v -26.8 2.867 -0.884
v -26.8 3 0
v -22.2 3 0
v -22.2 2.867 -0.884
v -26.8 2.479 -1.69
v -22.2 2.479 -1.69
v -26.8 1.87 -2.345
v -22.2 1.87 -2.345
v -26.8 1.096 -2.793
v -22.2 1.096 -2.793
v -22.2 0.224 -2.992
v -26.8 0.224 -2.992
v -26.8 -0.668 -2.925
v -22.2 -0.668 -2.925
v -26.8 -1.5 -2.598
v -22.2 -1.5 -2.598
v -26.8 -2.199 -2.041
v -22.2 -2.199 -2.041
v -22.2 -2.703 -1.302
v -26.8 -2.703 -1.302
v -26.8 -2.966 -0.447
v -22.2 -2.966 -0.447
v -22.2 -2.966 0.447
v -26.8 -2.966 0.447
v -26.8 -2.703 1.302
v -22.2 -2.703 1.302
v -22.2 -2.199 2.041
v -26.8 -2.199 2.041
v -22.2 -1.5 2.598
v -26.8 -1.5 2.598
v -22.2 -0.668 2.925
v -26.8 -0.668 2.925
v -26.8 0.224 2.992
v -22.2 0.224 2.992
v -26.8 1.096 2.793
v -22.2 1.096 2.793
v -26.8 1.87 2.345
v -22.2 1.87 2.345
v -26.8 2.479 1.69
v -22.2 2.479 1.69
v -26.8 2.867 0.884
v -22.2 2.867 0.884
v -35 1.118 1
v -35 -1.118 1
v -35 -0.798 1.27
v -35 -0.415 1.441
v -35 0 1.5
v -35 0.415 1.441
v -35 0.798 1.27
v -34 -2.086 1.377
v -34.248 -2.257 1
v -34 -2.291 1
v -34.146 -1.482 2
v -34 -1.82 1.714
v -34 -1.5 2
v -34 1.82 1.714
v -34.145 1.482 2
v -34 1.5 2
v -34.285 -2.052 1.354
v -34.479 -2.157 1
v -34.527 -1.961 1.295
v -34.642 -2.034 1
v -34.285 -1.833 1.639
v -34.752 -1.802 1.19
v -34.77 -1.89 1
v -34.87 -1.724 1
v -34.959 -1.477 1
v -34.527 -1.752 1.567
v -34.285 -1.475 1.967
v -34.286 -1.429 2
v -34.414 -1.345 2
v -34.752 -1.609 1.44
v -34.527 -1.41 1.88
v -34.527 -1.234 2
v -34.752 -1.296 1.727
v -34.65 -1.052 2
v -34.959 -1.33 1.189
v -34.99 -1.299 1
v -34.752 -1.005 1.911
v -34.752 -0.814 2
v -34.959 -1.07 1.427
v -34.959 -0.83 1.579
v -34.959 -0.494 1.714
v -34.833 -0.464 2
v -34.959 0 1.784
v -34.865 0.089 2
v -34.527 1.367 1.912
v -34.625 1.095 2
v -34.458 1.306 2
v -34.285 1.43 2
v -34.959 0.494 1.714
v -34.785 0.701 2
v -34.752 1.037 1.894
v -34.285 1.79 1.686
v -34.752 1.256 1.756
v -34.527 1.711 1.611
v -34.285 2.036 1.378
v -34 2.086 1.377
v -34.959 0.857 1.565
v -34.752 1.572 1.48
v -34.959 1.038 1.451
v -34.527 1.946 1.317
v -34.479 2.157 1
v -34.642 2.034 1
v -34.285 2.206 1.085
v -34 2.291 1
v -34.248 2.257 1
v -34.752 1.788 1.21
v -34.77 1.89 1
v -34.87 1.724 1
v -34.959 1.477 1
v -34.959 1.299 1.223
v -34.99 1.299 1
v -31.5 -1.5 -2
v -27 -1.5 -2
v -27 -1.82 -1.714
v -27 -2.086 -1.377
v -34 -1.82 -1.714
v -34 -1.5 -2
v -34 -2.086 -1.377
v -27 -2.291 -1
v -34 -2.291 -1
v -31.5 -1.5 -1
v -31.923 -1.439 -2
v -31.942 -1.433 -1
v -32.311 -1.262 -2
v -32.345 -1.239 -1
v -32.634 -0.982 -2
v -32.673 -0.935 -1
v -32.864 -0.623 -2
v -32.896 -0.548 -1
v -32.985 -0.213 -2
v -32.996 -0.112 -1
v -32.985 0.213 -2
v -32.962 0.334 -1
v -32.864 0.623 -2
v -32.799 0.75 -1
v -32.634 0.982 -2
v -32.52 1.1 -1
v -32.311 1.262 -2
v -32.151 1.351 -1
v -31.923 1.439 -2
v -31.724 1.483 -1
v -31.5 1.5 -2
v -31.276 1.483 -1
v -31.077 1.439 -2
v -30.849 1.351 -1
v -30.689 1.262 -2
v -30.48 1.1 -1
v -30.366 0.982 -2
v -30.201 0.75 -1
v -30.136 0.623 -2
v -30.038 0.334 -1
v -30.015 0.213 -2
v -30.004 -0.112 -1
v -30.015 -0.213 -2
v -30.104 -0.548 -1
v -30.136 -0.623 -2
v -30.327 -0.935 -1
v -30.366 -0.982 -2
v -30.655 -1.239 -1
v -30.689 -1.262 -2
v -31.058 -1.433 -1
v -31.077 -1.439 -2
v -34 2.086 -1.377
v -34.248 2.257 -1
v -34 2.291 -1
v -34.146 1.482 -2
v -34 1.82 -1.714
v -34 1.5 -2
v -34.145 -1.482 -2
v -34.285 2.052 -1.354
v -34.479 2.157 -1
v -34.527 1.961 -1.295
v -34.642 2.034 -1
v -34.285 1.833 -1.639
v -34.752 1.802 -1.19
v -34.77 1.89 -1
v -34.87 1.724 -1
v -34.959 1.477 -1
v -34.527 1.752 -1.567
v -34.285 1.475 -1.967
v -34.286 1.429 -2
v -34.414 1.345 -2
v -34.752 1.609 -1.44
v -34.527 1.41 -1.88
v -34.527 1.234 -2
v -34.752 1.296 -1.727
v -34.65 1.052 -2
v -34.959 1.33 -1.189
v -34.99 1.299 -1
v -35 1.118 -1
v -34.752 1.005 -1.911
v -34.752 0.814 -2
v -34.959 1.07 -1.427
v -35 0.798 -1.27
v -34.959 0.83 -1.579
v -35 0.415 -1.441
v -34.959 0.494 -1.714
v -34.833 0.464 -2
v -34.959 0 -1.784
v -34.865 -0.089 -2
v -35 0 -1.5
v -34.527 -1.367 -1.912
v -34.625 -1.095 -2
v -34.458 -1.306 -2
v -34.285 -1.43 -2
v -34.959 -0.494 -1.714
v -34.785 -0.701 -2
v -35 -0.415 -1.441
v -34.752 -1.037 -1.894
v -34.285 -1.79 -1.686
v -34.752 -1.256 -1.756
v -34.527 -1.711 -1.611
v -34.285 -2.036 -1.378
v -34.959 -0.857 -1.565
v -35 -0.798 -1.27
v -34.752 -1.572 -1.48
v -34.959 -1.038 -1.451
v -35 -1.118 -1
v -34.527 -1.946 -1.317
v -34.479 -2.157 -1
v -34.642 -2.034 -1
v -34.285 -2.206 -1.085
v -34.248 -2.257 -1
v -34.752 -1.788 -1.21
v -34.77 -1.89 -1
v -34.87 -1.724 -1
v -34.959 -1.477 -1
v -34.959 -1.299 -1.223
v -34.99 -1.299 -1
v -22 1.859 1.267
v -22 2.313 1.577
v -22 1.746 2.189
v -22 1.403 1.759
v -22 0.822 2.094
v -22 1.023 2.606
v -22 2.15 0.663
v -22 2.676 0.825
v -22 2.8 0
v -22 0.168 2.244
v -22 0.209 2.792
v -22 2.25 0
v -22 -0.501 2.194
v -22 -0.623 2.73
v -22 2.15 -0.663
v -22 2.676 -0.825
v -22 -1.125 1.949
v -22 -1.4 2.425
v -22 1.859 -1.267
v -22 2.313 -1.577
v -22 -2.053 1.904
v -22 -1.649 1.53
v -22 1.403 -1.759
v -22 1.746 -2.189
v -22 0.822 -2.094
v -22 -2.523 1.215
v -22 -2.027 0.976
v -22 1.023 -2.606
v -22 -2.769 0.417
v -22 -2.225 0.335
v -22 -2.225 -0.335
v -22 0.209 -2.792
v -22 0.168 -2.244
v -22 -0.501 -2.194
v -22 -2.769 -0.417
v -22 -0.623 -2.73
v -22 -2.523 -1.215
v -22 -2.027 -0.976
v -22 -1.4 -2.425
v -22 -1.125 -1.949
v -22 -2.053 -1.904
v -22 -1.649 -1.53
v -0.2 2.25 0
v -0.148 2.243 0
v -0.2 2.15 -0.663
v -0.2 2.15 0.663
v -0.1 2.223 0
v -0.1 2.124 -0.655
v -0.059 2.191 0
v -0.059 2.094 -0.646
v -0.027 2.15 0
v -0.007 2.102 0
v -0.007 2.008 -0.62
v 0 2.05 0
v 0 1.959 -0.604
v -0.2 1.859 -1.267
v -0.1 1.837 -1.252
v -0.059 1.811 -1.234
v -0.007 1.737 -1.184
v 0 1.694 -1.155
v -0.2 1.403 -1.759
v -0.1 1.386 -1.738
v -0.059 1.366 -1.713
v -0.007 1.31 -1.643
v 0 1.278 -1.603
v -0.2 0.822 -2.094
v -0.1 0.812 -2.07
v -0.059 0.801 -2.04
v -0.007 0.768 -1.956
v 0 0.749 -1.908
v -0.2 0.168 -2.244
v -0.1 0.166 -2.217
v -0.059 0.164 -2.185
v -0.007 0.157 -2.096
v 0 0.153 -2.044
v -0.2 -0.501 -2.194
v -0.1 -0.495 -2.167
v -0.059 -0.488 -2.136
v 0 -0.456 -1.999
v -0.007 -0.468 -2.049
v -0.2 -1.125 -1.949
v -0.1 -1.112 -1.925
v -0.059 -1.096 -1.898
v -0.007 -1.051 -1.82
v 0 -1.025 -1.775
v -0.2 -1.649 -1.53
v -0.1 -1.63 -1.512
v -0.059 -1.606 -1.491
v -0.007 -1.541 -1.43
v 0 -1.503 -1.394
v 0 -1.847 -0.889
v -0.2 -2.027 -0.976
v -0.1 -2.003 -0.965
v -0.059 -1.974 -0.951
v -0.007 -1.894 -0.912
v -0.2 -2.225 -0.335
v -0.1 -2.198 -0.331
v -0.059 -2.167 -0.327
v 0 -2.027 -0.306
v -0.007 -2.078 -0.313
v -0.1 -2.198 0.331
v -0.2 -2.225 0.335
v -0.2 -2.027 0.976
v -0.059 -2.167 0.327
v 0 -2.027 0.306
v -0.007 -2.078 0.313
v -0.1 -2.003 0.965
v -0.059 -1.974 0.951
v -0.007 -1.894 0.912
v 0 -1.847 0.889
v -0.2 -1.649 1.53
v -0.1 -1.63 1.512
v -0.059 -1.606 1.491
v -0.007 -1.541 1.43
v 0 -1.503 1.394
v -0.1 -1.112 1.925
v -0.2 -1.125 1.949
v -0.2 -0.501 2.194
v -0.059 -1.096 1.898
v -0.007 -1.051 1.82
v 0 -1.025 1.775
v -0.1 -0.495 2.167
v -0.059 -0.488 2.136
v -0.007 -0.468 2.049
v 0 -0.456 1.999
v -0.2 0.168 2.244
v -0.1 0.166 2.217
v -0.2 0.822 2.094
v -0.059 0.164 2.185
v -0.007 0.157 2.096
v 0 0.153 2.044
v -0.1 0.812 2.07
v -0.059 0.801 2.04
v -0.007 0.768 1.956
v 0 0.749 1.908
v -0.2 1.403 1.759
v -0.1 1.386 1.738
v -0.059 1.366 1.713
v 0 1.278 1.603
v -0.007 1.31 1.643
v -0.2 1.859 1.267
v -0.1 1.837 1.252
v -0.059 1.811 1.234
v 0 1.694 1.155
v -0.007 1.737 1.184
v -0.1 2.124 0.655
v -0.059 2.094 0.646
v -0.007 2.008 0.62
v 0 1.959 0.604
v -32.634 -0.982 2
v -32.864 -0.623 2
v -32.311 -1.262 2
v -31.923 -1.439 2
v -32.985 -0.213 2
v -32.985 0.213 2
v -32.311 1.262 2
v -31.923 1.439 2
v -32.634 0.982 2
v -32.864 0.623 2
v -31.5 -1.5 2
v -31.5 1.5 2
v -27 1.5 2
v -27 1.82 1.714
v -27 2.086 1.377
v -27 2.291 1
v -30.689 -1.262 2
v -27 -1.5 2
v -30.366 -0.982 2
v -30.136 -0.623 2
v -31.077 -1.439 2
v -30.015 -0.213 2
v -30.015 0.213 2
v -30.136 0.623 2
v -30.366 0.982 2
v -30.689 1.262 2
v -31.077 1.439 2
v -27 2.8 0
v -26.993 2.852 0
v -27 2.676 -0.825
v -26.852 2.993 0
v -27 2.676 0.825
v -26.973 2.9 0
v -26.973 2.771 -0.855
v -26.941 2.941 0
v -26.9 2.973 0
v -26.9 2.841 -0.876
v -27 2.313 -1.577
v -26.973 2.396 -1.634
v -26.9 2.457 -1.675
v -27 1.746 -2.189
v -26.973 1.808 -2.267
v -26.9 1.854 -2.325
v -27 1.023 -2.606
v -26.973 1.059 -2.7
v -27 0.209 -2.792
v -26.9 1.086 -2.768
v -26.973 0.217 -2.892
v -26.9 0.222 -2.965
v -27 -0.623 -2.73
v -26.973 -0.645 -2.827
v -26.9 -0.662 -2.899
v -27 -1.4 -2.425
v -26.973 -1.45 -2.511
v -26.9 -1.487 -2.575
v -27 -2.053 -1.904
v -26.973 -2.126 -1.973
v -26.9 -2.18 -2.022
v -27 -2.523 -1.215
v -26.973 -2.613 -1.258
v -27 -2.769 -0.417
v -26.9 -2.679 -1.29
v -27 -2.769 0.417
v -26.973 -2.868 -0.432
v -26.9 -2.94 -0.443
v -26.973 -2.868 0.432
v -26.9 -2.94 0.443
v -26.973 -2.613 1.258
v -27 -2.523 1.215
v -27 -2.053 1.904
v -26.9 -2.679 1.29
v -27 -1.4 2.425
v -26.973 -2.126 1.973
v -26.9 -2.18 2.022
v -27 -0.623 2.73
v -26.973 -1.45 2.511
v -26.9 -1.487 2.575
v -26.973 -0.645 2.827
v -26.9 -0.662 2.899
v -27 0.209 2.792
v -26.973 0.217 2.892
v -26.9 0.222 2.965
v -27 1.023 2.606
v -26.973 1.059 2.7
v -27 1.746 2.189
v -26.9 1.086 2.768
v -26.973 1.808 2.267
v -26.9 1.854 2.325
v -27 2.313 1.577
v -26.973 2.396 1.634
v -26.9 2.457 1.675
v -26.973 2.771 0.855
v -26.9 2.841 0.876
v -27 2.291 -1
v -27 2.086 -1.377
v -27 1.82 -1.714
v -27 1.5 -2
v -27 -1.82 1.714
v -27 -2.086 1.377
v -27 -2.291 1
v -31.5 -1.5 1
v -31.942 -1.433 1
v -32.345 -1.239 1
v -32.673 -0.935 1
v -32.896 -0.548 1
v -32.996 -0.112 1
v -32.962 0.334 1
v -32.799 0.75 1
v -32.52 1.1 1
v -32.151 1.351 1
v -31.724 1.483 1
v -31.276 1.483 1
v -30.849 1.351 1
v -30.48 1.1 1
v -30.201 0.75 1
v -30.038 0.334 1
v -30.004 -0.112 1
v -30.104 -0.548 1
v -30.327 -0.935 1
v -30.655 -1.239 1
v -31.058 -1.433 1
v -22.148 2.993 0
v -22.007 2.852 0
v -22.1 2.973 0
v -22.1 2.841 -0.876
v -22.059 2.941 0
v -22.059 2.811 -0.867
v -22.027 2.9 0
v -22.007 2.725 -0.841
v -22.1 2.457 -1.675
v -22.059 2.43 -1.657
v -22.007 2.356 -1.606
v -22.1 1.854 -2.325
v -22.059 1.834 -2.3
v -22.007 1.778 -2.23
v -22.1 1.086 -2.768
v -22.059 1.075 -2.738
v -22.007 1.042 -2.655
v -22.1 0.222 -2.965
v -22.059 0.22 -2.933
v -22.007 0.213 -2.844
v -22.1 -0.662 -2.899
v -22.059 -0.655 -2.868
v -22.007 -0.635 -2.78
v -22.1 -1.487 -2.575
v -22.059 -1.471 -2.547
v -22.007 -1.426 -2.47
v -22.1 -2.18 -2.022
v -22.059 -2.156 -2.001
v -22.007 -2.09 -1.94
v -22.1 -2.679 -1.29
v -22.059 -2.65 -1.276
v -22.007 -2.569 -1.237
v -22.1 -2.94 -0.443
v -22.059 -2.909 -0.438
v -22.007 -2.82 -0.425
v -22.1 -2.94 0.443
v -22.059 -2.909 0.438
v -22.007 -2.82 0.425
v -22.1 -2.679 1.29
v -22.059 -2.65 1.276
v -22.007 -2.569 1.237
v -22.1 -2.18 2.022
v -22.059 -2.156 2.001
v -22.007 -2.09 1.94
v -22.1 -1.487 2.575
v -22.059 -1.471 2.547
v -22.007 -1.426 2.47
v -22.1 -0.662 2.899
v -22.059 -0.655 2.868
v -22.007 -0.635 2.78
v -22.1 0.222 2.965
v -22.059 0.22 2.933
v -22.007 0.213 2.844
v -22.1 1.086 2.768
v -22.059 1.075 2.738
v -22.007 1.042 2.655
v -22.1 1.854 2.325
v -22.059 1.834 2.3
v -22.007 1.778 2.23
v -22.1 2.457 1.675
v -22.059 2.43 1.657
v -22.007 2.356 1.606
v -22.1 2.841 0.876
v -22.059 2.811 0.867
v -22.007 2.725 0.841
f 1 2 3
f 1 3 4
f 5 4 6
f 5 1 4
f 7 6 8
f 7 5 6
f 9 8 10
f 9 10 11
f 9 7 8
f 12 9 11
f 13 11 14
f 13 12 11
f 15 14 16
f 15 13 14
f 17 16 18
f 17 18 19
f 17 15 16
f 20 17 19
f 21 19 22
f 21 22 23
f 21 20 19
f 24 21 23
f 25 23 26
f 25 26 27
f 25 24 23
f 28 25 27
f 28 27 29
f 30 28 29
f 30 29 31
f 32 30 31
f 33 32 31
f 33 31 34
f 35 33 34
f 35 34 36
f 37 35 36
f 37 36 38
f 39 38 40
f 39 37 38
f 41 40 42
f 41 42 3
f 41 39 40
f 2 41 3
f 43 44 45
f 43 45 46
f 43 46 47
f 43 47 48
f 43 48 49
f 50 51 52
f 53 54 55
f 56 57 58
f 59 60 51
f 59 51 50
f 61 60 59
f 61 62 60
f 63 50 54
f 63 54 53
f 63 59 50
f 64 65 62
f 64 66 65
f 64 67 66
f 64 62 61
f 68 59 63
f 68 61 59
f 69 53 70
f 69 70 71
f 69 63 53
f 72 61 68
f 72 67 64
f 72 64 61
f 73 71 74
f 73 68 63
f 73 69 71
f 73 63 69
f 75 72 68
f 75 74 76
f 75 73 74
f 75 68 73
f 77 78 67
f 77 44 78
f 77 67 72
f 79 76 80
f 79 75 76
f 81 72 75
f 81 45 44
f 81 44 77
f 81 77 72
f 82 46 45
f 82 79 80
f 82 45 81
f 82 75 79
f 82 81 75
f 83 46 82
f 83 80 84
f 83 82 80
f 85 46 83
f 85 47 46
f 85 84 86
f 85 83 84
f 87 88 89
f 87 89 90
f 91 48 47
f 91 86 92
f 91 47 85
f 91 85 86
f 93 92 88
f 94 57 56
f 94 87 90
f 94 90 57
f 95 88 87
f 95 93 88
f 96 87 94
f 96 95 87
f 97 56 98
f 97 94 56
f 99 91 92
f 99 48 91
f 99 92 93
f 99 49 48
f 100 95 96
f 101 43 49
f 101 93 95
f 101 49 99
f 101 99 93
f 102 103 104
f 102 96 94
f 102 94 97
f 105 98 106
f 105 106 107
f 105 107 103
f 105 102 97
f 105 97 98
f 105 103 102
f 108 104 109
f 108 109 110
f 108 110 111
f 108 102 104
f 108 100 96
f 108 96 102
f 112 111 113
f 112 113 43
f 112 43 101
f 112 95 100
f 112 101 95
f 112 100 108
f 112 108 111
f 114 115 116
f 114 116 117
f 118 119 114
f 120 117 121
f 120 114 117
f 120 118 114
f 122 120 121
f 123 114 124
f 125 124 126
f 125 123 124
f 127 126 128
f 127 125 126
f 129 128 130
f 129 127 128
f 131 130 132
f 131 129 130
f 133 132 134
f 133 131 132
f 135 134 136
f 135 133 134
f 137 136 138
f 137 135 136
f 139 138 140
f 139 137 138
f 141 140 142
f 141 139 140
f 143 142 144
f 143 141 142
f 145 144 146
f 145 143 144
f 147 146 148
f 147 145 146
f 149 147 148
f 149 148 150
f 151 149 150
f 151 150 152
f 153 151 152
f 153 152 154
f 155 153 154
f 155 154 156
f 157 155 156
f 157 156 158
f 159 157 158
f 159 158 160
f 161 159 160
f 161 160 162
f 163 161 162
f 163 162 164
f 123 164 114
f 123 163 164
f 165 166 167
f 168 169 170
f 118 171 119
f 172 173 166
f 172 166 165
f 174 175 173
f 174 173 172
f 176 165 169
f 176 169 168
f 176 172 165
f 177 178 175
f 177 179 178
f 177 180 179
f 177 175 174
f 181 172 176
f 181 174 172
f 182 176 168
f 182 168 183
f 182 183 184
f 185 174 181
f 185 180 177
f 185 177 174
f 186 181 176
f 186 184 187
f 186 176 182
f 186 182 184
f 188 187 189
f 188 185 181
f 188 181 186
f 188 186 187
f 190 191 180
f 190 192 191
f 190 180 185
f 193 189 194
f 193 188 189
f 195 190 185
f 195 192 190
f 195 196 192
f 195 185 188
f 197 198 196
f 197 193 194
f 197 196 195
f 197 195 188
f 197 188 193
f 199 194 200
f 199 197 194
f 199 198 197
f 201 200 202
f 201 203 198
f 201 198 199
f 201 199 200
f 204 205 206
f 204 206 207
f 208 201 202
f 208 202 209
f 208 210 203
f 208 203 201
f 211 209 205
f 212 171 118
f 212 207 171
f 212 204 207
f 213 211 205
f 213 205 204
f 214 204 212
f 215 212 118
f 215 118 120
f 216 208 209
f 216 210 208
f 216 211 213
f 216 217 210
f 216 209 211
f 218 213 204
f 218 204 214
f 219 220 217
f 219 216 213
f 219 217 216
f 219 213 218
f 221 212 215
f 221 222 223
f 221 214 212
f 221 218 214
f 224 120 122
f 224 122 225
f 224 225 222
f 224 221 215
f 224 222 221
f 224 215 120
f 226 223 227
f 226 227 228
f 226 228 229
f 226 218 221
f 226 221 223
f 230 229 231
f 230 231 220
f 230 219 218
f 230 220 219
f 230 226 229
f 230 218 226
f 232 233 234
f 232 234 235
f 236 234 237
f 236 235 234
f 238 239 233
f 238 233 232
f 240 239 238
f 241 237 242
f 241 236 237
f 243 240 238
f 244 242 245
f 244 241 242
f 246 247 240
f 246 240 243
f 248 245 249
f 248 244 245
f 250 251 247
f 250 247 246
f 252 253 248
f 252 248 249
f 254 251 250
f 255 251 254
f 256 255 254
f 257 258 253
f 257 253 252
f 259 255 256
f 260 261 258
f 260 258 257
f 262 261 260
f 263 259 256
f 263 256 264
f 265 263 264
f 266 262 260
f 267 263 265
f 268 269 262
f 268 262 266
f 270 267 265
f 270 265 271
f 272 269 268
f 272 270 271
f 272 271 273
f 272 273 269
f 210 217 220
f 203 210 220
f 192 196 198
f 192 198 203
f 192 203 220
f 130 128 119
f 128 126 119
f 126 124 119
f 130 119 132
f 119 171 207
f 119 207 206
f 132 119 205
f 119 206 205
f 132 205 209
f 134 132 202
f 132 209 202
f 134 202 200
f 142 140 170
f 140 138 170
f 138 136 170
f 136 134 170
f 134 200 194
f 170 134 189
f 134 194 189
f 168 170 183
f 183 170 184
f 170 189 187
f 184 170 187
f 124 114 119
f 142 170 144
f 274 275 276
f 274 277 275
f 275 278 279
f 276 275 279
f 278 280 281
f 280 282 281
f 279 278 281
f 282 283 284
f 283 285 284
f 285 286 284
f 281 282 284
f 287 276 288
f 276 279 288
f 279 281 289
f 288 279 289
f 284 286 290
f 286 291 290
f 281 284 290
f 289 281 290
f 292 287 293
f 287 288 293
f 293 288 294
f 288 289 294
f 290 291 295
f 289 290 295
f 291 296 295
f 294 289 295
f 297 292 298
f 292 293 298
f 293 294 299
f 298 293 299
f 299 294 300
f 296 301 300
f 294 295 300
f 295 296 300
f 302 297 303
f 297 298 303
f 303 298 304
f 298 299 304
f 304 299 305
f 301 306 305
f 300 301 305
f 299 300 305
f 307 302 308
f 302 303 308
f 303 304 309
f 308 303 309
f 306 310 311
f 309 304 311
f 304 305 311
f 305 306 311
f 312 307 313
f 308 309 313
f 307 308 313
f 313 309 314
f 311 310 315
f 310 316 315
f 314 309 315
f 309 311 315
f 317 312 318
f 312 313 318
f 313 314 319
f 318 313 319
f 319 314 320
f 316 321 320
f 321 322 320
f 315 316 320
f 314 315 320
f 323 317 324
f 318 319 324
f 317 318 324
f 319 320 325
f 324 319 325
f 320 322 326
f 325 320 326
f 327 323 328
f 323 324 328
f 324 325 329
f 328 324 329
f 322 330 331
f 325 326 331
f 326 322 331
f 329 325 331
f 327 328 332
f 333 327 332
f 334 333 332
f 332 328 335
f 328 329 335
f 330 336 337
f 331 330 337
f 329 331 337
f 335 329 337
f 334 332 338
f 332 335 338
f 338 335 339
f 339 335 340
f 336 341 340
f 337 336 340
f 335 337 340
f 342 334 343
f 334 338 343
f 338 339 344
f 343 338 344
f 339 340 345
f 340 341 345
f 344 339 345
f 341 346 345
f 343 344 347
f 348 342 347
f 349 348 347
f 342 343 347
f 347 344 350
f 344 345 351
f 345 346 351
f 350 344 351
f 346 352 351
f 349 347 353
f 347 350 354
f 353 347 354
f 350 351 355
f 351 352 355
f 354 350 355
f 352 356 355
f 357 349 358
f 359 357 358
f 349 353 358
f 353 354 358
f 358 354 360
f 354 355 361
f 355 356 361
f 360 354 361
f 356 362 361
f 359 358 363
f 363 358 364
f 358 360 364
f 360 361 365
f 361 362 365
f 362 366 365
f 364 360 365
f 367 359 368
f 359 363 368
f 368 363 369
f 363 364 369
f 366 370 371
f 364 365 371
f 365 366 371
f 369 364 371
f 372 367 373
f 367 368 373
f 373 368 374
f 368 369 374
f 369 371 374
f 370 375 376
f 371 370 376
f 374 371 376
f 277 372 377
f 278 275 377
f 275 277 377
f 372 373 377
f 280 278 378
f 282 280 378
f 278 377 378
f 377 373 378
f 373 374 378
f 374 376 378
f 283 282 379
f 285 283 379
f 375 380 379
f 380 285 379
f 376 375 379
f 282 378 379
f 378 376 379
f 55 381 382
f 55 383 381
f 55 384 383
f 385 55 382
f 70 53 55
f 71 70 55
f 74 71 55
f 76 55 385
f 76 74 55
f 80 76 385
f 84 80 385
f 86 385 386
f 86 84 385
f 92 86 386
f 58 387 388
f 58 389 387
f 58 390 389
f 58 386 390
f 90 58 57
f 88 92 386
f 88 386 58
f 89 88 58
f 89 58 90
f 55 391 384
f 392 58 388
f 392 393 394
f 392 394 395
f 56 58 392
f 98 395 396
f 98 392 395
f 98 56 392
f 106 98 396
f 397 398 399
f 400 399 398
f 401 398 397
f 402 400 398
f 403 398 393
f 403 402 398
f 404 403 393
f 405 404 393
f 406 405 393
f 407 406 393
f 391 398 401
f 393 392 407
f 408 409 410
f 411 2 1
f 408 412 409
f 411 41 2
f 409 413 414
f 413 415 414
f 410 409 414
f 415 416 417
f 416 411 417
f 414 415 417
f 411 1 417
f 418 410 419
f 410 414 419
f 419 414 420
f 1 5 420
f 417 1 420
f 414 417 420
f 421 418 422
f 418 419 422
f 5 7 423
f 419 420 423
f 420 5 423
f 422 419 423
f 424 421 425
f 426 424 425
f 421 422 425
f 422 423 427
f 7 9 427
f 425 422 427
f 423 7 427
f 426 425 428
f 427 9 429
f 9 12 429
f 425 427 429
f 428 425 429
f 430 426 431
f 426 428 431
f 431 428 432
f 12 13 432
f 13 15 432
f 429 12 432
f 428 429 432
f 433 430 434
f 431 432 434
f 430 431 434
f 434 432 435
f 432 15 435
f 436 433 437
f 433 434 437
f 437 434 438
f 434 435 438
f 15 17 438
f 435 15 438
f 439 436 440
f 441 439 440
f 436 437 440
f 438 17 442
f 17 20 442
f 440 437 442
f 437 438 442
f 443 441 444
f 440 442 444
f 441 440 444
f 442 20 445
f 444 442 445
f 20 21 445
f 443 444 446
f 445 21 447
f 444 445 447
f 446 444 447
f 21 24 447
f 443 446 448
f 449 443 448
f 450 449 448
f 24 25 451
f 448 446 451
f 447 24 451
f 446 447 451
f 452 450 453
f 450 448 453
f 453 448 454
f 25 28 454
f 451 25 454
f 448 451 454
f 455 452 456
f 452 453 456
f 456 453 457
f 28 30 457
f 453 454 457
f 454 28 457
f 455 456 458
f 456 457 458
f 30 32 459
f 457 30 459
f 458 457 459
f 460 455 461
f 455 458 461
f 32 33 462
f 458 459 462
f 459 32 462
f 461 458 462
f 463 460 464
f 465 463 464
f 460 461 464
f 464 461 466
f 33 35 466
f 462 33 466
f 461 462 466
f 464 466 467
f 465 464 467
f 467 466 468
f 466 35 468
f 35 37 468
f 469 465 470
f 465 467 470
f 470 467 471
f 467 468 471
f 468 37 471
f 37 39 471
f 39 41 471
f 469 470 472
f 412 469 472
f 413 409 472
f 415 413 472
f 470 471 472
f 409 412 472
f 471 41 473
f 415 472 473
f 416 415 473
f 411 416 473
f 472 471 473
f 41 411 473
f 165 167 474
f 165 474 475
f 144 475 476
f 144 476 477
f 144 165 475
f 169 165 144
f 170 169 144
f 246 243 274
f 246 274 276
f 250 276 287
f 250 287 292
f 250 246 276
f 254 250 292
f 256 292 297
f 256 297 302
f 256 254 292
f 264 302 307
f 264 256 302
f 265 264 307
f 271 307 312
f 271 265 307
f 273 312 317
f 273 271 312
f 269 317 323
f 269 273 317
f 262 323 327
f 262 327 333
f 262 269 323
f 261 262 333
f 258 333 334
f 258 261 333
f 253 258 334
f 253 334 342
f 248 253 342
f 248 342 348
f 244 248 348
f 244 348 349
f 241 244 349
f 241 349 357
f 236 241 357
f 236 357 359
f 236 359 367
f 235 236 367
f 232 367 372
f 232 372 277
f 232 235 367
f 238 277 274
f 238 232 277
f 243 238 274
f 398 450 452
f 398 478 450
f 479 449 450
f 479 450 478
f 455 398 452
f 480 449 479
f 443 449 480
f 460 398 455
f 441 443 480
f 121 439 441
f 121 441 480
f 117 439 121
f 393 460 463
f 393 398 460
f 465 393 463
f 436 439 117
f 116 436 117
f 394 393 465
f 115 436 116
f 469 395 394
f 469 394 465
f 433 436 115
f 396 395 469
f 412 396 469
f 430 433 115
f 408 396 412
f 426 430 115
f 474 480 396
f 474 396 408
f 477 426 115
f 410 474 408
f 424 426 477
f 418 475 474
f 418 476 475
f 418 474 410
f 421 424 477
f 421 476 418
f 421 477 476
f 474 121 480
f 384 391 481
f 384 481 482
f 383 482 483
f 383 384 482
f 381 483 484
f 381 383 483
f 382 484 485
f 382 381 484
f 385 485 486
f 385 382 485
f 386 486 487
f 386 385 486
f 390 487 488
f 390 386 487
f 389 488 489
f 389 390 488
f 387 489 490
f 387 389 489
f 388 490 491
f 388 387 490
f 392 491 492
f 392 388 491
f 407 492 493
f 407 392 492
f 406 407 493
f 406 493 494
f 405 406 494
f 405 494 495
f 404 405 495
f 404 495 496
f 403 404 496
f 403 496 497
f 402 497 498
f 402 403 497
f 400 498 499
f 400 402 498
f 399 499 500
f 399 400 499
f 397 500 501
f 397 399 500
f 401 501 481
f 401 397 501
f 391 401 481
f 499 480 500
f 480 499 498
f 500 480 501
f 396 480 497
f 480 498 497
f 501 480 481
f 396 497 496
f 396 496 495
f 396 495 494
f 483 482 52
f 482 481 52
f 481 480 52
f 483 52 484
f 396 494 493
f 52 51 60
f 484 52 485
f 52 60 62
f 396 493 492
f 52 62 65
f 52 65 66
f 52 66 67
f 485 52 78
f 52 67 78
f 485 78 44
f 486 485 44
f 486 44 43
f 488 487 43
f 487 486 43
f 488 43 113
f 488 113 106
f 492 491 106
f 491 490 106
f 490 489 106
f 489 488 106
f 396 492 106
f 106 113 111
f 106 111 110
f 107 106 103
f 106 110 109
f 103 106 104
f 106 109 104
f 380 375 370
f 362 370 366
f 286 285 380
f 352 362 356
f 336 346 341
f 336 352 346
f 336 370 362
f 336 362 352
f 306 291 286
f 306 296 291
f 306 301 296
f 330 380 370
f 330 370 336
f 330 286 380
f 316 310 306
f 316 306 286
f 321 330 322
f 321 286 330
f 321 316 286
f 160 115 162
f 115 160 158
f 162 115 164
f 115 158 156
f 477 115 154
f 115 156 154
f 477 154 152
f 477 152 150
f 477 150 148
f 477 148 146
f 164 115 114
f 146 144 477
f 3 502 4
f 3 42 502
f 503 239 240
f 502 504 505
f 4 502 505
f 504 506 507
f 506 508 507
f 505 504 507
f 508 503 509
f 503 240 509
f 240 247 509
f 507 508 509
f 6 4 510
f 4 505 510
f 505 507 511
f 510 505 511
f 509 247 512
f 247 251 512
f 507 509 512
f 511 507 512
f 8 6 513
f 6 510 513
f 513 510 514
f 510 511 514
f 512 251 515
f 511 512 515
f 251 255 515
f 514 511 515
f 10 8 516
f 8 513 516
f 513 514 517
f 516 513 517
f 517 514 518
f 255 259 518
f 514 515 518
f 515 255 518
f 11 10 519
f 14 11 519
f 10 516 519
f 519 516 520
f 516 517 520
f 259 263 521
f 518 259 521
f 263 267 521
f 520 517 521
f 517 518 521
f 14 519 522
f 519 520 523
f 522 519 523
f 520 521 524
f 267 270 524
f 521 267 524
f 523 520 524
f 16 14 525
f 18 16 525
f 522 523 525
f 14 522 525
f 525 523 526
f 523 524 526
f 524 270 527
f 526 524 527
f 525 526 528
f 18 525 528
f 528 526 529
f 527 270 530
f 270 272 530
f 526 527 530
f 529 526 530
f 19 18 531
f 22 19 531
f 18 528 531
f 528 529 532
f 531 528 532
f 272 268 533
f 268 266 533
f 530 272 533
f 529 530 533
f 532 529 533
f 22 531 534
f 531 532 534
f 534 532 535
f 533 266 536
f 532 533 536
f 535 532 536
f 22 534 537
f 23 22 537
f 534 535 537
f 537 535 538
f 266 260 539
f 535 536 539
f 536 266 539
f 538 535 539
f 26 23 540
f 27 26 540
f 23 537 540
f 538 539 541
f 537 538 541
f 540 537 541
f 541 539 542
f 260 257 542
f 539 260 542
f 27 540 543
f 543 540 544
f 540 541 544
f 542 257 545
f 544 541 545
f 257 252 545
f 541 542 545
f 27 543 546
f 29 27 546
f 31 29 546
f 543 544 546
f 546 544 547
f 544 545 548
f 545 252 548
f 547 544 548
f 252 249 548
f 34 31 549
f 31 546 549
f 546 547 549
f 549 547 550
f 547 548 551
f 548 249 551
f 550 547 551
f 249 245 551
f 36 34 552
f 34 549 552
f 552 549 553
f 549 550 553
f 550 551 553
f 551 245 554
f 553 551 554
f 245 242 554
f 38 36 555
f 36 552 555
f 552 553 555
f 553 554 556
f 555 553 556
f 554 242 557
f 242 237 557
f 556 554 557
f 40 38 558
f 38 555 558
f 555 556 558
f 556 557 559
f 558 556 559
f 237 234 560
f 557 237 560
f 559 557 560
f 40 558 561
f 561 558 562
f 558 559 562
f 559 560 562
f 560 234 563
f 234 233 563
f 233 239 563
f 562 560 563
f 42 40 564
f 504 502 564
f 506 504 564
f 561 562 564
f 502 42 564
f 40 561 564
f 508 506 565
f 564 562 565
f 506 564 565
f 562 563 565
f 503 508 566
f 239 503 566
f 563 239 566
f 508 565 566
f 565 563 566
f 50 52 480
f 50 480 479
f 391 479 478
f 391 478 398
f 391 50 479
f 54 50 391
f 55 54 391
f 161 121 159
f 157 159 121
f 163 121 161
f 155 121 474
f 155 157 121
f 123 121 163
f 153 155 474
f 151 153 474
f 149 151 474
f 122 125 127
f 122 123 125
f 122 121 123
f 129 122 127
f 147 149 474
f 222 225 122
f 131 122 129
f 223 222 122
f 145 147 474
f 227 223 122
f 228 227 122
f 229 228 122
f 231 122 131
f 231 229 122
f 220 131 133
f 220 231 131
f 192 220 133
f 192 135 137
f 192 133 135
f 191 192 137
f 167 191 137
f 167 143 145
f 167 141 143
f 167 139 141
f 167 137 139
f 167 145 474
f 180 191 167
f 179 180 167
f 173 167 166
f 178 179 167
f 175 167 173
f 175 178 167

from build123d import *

# Parameters (mm, degrees)
FILLET_1_R               = 1
SKETCH_2_R               = 7.321356554
SKETCH_2_W               = 1
SKETCH_2_H               = 8.939101976
SKETCH_2_H_2             = 8.847887315
CUT_EXTRUDE_1_DEPTH      = 8
FILLET_2_R               = 0.2
CUT_EXTRUDE_2_DEPTH      = 36.355339178
CUT_EXTRUDE_2_DEPTH_BACK = 36.355339178
SKETCH_3_R               = 1.5


with BuildPart() as part:
    # 草图1 → 旋转1 (revolve)
    with BuildSketch(Plane.XY):
        Polygon((0, 0), (0, 2.25), (-22, 2.25), (-22, 3), (-27, 3), (-27, 2.5), (-35, 2.5), (-35, 0), align=None)
    revolve(axis=Axis((0, 0, 0), (-1, 0, 0)))

    # 圆角1
    fillet_1_edges = [part.edges().sort_by_distance(p)[0] for p in [
        (-35, -2.5, 0),
    ]]
    fillet(fillet_1_edges, radius=FILLET_1_R)

    # 草图2 → 切除-拉伸1 (cut)
    with BuildSketch(Plane.ZY.offset(35)):
        Circle(SKETCH_2_R)
        with Locations((-1.5, 0.70306053)):
            Rectangle(SKETCH_2_W, SKETCH_2_H, mode=Mode.SUBTRACT)
        with Locations((1.5, 0.129971064)):
            Rectangle(SKETCH_2_W, SKETCH_2_H_2, mode=Mode.SUBTRACT)
    extrude(amount=-CUT_EXTRUDE_1_DEPTH, mode=Mode.SUBTRACT)

    # 圆角2
    fillet_2_edges = [part.edges().sort_by_distance(p)[0] for p in [
        (-27, -3, 0),
        (-22, -3, 0),
        (0, -2.25, 0),
    ]]
    fillet(fillet_2_edges, radius=FILLET_2_R)

    # 草图3 → 切除-拉伸2 (cut, two sides: drawn at the far end of the back side and taken through both)
    with BuildSketch(Plane(origin=(0, 0, -1), x_dir=(-1, 0, 0), z_dir=(0, 0, -1)).offset(-CUT_EXTRUDE_2_DEPTH_BACK)):
        with Locations(Location((31.5, 0, 0), (0, 0, 270))):
            Circle(SKETCH_3_R)
    extrude(amount=CUT_EXTRUDE_2_DEPTH + CUT_EXTRUDE_2_DEPTH_BACK, mode=Mode.SUBTRACT)


solid = part.part
